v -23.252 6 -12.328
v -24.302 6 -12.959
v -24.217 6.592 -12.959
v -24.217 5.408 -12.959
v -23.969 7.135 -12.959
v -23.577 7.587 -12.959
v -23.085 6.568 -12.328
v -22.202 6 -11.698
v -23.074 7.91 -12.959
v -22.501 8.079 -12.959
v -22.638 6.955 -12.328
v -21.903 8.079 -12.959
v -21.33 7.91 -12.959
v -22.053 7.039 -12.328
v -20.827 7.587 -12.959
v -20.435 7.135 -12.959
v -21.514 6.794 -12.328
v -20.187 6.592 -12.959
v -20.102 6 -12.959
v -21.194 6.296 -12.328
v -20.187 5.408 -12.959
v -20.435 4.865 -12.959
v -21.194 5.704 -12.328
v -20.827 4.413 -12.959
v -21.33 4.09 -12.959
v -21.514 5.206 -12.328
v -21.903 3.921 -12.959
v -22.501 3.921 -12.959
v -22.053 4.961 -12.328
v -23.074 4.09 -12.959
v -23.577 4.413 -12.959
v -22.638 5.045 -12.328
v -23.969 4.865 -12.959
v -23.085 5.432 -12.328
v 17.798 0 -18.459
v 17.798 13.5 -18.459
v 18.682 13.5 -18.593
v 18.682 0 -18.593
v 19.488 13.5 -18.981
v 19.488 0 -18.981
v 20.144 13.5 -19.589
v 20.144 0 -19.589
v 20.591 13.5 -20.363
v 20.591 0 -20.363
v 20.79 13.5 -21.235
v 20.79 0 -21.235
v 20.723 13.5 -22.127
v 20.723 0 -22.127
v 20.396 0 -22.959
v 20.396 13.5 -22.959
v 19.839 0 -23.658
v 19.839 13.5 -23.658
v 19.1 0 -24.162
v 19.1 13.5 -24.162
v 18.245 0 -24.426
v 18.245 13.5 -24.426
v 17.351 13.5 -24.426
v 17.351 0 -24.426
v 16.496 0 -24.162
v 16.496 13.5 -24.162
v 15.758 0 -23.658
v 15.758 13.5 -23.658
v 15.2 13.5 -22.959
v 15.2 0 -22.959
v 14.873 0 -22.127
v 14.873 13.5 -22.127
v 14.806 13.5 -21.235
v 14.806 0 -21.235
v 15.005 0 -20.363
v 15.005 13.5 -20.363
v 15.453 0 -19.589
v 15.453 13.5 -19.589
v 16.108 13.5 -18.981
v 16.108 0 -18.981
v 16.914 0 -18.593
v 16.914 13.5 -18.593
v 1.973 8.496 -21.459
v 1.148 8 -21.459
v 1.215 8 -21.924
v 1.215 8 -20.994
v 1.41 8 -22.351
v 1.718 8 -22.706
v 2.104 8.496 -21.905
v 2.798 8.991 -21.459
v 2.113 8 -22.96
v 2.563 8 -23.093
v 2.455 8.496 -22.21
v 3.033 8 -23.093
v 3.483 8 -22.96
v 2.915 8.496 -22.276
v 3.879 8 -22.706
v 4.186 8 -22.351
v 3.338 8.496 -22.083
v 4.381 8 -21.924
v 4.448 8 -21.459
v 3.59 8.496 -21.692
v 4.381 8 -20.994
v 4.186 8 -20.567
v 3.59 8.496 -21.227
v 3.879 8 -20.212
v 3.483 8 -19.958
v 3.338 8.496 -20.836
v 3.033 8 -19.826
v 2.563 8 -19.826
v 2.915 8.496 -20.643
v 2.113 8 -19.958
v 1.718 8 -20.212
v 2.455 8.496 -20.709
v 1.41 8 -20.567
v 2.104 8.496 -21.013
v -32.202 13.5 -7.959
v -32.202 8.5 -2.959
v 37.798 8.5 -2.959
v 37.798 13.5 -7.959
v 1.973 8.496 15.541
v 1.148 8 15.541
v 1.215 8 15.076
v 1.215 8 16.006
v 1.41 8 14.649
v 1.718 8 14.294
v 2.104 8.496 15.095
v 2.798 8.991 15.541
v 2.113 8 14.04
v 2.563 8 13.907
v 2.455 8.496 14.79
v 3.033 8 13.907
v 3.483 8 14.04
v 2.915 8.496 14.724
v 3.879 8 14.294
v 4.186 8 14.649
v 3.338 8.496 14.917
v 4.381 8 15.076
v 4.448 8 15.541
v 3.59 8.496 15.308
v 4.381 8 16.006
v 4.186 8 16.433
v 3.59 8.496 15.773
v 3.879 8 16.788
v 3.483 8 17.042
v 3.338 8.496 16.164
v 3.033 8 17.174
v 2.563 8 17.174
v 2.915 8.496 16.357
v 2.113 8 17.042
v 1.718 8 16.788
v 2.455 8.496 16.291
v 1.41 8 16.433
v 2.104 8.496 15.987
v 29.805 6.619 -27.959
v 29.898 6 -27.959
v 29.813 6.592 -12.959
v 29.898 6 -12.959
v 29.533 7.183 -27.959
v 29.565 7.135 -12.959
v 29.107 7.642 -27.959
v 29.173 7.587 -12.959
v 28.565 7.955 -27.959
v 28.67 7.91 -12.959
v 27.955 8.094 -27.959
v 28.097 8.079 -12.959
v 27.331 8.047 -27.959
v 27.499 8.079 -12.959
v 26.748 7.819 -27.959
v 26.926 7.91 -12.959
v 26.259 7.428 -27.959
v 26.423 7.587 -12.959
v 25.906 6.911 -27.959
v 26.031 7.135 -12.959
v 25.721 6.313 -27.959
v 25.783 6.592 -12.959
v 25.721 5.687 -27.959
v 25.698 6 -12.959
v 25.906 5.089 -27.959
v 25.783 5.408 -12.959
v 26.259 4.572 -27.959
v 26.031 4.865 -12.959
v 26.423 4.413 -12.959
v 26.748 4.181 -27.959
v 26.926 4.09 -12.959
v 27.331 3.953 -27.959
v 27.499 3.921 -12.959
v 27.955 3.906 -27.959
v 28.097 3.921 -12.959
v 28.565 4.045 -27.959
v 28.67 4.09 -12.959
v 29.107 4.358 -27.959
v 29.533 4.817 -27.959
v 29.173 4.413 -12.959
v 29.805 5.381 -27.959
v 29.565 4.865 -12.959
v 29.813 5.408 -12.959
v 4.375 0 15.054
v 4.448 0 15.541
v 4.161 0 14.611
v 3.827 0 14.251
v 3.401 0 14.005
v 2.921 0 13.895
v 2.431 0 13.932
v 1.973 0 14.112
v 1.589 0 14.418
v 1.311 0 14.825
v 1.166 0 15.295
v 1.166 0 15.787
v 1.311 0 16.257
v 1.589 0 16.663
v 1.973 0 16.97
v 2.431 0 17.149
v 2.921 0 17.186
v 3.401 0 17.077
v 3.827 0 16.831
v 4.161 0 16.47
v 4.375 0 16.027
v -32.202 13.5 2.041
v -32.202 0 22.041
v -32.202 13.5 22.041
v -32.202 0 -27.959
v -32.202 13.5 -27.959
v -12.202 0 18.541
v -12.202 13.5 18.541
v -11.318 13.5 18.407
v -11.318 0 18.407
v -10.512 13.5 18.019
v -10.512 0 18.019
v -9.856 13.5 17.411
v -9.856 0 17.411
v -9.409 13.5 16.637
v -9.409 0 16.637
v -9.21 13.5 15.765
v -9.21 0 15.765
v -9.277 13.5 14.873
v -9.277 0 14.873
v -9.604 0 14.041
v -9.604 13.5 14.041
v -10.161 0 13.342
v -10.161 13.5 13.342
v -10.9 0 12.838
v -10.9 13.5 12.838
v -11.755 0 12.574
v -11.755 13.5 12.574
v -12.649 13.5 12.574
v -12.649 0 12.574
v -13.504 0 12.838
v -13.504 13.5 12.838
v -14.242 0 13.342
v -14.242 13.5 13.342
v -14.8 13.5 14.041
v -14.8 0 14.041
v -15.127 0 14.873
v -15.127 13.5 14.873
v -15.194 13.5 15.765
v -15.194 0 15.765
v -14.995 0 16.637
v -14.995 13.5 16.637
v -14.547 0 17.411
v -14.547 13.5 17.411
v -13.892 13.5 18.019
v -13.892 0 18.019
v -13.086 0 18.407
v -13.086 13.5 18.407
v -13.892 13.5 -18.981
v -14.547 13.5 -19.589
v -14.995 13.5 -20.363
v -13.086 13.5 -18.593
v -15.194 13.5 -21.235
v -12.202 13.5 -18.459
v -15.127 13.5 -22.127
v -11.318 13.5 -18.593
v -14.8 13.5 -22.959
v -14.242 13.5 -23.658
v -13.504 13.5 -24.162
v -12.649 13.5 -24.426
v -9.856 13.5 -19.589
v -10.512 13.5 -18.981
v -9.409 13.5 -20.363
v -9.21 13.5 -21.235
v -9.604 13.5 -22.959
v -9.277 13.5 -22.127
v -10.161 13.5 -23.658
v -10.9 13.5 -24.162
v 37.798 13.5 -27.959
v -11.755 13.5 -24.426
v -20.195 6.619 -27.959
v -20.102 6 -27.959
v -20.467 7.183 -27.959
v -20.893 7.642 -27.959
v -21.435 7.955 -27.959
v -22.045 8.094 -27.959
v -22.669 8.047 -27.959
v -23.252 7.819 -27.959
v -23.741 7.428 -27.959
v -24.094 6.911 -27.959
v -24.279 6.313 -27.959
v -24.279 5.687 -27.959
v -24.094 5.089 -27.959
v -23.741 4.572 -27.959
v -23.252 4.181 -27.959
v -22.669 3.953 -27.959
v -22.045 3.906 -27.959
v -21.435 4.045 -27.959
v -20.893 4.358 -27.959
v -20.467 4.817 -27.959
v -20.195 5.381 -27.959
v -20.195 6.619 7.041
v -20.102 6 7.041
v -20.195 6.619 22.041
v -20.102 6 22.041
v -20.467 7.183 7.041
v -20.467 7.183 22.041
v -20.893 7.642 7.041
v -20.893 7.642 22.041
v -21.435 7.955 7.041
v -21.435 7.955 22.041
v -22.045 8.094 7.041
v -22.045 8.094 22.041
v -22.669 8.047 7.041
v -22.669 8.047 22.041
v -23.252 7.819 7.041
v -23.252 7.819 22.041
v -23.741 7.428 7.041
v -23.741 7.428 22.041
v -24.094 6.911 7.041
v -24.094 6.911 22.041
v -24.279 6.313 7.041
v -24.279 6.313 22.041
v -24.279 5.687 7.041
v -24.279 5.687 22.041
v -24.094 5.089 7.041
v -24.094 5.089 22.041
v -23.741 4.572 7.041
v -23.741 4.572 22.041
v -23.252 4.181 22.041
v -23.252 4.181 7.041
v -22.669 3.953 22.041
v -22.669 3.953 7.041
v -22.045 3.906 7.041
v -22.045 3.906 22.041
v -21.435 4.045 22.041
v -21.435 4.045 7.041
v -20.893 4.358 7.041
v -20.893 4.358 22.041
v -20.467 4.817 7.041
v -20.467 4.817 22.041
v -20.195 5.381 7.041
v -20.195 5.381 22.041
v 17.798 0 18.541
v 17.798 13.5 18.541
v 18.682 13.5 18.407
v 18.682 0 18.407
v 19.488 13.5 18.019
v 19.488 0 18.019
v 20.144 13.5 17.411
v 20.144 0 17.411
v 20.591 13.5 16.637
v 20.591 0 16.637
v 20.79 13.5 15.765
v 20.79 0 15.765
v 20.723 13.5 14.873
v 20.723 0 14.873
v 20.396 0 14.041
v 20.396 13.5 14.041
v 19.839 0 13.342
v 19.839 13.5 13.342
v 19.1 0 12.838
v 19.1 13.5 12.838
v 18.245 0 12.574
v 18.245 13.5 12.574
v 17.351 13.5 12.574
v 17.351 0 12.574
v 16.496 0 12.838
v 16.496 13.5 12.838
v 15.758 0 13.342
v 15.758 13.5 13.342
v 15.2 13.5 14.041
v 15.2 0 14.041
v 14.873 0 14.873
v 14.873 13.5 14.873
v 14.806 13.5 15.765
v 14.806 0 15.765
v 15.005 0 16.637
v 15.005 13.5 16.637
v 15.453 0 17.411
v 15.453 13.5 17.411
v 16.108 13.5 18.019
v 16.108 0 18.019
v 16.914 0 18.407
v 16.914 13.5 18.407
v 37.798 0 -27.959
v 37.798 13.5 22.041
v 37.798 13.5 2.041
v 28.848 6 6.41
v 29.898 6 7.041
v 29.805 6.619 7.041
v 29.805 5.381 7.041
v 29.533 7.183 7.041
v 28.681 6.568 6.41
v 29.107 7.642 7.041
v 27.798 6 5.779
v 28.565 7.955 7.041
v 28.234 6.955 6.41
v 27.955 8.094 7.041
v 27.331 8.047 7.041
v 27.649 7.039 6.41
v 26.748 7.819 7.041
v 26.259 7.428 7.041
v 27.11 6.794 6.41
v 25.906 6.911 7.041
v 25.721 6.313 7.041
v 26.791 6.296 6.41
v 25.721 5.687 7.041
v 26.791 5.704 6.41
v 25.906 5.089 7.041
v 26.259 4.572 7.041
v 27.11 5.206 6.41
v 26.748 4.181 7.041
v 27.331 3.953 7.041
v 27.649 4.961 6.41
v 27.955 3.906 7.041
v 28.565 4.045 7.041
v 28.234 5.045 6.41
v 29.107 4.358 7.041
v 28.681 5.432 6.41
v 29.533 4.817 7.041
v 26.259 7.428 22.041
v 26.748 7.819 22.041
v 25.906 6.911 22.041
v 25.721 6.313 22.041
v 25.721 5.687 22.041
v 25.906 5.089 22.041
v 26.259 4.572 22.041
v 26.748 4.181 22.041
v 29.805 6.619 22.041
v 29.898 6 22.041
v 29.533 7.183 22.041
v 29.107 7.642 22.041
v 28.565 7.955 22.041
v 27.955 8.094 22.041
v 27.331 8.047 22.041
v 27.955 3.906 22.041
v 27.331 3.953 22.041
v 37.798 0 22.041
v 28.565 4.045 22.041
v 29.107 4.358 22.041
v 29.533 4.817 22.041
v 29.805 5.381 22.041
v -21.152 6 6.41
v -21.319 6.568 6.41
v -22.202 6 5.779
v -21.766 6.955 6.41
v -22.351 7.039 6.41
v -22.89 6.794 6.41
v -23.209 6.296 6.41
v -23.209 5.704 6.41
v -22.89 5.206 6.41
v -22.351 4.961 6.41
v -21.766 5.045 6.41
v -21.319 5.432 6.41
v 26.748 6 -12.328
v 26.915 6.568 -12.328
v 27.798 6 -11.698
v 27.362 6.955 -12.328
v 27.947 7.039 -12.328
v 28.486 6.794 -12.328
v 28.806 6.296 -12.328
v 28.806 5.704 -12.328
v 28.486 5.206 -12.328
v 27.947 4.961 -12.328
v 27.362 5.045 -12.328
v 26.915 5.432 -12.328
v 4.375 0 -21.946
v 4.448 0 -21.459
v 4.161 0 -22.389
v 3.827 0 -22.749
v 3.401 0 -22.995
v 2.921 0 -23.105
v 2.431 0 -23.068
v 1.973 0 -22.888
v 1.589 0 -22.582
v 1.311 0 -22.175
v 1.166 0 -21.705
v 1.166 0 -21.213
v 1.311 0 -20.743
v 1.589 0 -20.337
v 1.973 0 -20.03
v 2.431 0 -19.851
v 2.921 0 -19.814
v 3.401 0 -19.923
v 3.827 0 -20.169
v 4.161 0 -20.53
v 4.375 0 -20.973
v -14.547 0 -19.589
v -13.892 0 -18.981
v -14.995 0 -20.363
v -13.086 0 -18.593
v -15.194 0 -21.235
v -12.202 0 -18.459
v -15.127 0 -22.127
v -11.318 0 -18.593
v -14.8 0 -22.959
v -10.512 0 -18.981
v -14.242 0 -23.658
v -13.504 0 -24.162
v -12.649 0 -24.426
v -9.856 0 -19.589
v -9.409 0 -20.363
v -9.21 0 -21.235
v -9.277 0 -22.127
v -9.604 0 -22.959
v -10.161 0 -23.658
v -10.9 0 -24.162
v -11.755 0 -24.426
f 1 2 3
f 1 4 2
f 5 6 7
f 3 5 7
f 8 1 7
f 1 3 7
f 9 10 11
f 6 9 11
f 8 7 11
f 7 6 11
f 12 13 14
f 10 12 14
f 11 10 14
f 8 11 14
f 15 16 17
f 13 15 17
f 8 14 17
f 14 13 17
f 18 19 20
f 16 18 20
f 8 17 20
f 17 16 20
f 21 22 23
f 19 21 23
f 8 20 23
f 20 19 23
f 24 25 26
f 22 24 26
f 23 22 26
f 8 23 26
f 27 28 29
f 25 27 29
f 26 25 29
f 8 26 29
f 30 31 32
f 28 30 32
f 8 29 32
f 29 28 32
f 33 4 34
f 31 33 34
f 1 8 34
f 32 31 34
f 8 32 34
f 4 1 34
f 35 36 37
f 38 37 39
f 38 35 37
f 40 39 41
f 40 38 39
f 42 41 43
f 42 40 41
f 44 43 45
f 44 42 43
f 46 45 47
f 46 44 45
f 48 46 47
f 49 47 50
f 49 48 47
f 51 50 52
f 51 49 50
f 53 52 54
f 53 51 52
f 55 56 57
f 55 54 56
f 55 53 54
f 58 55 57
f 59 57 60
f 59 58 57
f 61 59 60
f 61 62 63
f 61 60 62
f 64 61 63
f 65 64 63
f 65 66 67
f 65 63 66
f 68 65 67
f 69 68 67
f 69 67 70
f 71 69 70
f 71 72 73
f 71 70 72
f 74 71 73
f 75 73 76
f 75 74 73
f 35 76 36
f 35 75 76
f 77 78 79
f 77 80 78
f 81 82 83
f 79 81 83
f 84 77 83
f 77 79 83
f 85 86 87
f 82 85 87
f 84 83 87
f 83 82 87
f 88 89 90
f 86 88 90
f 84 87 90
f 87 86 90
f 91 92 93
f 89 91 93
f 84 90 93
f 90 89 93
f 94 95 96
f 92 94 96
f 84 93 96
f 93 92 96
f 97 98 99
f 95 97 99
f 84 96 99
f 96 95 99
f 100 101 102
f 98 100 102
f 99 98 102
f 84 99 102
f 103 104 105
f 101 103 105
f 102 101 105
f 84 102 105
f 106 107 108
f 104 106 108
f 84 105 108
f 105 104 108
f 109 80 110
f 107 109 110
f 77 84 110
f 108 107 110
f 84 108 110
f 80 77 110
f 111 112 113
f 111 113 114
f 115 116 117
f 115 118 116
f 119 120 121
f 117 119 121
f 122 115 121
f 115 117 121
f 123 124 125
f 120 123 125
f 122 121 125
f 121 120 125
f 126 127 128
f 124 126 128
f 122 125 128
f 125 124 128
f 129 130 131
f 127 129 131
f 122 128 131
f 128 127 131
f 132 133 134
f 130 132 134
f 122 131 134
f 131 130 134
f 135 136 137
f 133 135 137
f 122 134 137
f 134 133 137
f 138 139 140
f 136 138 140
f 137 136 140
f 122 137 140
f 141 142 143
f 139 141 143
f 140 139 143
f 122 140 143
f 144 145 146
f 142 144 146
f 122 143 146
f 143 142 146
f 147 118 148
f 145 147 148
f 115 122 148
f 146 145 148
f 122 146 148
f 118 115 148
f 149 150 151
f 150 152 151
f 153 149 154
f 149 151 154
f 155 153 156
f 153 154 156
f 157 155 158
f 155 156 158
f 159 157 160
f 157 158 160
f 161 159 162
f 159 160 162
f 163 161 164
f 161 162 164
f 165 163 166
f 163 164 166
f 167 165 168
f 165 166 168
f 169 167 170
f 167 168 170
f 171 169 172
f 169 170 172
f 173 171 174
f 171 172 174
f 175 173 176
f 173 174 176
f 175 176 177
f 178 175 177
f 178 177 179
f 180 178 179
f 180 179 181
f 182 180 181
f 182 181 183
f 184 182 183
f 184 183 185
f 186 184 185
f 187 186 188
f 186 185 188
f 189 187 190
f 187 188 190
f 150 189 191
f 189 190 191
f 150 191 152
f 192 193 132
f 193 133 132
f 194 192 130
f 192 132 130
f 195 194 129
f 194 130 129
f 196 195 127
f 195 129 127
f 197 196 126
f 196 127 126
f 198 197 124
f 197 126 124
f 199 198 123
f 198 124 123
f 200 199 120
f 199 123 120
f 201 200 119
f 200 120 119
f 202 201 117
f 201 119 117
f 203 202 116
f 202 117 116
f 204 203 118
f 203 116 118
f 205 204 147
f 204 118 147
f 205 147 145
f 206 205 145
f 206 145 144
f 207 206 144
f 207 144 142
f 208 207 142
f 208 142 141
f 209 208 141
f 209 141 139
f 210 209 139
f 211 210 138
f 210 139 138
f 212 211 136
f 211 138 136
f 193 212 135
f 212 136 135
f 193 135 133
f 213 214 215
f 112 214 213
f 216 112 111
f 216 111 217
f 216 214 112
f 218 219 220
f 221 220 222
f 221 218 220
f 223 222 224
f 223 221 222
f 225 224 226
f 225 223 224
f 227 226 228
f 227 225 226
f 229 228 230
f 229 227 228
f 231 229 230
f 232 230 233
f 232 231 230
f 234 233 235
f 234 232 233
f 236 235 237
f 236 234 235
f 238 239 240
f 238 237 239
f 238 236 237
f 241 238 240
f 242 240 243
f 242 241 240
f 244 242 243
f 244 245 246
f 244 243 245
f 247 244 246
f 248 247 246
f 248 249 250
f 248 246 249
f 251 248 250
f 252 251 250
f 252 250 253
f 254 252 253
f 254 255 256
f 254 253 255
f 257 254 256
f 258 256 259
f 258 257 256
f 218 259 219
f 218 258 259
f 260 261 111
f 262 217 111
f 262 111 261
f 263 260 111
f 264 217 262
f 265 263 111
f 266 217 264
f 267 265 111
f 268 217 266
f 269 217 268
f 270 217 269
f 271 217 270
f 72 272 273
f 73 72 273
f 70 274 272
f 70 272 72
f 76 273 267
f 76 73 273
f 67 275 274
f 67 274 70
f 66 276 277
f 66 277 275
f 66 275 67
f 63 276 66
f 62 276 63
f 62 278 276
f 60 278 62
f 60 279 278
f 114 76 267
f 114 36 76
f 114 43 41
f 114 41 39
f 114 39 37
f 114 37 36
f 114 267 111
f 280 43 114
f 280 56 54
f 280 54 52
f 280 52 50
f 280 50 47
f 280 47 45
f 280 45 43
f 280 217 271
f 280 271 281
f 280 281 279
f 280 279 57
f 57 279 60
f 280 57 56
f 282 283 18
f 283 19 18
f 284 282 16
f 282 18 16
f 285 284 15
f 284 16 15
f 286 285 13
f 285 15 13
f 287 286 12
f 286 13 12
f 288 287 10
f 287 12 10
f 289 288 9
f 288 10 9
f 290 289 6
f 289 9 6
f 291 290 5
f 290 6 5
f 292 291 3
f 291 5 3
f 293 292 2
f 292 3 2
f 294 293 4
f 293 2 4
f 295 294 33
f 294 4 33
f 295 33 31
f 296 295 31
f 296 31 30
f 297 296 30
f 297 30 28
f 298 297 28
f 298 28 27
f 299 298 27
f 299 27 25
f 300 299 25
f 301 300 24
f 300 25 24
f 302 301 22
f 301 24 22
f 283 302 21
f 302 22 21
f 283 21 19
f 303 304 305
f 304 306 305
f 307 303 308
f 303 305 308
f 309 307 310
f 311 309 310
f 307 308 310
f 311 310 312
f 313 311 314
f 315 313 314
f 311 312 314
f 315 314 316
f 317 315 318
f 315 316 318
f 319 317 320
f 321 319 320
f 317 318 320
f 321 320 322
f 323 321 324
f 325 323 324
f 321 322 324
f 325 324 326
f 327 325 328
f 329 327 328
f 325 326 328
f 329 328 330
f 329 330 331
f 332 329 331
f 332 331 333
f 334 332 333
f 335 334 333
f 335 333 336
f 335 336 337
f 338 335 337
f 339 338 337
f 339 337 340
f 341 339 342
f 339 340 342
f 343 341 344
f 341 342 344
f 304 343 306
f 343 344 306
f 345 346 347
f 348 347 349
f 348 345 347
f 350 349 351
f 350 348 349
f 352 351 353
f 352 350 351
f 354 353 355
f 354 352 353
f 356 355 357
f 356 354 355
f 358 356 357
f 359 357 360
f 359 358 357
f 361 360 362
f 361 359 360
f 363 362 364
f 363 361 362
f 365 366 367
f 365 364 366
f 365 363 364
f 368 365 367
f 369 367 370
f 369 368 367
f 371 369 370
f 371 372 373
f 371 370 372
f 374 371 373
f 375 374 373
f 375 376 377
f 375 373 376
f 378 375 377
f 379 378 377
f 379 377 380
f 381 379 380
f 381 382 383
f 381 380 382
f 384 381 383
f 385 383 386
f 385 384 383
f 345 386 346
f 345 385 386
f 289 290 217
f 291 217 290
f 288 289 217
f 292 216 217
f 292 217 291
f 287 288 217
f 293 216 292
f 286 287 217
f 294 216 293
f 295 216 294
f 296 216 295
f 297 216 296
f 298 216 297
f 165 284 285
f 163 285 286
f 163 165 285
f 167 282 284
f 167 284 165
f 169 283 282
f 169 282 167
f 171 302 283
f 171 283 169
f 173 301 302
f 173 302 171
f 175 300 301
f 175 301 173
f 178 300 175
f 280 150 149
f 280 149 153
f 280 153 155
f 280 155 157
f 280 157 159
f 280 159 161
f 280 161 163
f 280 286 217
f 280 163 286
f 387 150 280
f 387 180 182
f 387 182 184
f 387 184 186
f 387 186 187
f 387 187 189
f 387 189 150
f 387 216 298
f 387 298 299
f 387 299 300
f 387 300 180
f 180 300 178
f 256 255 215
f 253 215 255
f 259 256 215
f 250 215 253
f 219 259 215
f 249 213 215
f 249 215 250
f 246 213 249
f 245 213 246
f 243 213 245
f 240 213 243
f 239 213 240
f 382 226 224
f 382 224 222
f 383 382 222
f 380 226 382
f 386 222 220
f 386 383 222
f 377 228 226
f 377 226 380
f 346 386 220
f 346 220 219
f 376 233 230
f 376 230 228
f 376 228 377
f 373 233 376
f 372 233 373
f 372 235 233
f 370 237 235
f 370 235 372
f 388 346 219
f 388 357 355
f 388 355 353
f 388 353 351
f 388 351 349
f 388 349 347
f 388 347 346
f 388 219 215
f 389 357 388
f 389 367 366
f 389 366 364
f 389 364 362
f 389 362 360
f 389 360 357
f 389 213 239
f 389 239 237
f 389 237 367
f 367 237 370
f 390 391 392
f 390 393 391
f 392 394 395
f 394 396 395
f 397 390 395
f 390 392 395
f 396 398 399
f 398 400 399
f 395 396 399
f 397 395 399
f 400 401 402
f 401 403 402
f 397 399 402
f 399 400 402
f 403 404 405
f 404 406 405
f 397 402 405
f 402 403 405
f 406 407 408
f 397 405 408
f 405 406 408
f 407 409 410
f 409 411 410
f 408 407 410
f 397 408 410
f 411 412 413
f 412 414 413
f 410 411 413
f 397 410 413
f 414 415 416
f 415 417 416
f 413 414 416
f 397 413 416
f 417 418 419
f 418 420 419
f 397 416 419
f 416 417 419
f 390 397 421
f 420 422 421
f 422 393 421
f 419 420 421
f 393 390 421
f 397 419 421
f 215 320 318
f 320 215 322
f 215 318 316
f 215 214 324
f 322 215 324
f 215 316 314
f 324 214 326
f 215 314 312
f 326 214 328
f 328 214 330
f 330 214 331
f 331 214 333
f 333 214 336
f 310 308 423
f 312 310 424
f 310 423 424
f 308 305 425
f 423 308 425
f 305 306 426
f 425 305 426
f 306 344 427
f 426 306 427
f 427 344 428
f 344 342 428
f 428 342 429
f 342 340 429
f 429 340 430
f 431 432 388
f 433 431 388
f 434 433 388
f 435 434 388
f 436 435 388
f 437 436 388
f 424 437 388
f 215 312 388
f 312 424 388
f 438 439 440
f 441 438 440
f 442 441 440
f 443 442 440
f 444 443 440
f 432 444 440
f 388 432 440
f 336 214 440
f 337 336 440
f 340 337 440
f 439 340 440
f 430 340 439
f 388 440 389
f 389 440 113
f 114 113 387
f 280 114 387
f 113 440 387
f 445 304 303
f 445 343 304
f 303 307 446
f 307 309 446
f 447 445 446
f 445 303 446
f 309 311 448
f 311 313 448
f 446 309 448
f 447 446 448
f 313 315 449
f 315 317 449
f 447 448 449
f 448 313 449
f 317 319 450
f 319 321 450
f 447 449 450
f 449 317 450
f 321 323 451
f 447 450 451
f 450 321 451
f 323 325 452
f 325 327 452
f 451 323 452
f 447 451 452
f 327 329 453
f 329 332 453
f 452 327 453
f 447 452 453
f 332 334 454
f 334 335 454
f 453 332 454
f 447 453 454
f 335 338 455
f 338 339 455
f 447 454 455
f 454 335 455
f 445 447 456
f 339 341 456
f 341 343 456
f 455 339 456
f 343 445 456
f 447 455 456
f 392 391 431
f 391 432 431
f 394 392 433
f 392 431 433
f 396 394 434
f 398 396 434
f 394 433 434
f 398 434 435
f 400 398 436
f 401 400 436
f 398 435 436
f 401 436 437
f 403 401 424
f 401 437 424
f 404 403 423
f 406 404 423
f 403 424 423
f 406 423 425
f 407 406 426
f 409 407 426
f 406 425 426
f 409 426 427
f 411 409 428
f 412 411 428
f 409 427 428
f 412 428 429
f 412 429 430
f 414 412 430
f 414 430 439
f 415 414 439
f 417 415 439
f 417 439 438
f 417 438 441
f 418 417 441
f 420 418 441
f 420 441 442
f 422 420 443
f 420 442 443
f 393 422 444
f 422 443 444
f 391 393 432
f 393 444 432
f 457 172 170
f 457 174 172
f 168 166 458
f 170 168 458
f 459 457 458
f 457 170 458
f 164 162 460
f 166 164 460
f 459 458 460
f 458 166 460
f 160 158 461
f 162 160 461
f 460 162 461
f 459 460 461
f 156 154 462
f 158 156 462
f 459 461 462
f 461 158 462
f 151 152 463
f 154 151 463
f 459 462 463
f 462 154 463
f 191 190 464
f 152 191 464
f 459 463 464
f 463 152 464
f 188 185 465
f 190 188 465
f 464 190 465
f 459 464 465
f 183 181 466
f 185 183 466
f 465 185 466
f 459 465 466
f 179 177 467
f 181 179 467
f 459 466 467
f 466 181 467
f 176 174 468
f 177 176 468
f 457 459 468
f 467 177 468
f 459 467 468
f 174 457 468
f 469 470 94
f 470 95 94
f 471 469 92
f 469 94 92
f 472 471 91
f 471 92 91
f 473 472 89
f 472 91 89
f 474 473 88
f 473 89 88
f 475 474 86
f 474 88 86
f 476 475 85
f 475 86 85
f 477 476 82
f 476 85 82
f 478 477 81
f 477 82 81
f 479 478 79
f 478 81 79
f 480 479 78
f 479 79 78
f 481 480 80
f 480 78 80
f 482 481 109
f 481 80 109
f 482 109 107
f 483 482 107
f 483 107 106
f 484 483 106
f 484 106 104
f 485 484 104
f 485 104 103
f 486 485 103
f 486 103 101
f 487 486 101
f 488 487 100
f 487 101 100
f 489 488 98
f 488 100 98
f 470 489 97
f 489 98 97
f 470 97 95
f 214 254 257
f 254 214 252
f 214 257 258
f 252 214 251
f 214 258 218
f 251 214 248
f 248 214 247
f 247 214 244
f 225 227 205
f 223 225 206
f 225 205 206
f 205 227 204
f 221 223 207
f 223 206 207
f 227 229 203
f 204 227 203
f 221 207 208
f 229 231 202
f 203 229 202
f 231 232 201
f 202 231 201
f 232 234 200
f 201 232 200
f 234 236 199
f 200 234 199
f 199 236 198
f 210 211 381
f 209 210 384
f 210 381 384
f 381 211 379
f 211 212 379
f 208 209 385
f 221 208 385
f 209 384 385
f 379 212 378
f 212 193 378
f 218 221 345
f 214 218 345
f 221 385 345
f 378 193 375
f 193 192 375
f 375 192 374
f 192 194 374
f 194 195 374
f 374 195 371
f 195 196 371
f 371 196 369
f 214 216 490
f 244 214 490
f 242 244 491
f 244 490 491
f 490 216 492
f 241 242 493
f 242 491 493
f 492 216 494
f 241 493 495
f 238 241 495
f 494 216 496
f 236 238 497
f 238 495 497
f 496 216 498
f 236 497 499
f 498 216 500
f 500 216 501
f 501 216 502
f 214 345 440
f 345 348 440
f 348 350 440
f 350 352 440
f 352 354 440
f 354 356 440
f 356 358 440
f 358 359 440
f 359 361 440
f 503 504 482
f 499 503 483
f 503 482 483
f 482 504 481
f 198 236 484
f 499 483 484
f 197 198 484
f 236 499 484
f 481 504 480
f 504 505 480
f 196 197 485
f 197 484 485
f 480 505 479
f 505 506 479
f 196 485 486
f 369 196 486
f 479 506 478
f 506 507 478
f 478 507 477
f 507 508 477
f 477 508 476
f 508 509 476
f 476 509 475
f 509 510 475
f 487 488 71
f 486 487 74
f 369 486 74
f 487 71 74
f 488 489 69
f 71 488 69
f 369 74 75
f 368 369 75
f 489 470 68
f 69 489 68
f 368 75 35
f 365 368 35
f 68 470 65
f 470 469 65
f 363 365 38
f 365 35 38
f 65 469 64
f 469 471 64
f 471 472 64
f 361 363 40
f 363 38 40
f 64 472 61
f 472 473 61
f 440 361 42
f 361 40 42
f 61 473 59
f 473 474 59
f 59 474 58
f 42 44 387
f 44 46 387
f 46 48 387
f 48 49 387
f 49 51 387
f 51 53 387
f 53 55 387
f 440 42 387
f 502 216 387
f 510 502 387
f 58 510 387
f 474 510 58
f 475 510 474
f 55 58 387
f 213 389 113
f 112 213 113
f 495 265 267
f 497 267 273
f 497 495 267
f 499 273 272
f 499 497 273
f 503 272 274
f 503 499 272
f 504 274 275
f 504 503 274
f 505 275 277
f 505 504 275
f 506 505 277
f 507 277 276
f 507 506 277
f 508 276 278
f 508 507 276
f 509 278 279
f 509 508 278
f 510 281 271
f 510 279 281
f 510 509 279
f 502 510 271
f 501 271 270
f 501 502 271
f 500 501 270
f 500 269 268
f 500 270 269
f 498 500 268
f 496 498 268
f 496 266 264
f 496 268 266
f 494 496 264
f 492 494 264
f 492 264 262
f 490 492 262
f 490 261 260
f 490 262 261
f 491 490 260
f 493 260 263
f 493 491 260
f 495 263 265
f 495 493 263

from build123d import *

# Parameters (mm, degrees)
SKETCH1_W             = 70
SKETCH1_H             = 50
BOSS_EXTRUDE1_DEPTH   = 13.5
CUT_EXTRUDE1_DEPTH    = 78.5
SKETCH6_R             = 3
CUT_EXTRUDE2_DEPTH    = 200
M4_TAPPED_HOLE1_D     = 3.3
M4_TAPPED_HOLE1_DEPTH = 8
M4_TAPPED_HOLE1_TIP   = 0.991420021
M5_TAPPED_HOLE1_D     = 4.2
M5_TAPPED_HOLE1_DEPTH = 15
M5_TAPPED_HOLE1_TIP   = 1.2618073


# Read off the part's stored shape, not the designer's step: M5 Tapped Hole2
with BuildPart() as part:
    # Sketch1 → Boss-Extrude1 (new body)
    with BuildSketch(Plane(origin=(0, 0, 0), x_dir=(1, 0, 0), z_dir=(0, 1, 0))):
        with Locations((2.798036466, 2.959326788)):
            Rectangle(SKETCH1_W, SKETCH1_H)
    extrude(amount=BOSS_EXTRUDE1_DEPTH)

    # Sketch3 → Cut-Extrude1 (cut)
    with BuildSketch(Plane.ZY.offset(32.201963534)):
        Polygon((-2.959326788, 8.5), (-7.959326788, 13.5), (2.040673212, 13.5), align=None)
    extrude(amount=-CUT_EXTRUDE1_DEPTH, mode=Mode.SUBTRACT)

    # Sketch6 → Cut-Extrude2 (cut)
    with BuildSketch(Plane(origin=(0, 0, 0), x_dir=(1, 0, 0), z_dir=(0, 1, 0))):
        with Locations(Location((-12.201963534, -15.540673212, 0), (0, 0, 270))):
            Circle(SKETCH6_R)
        with Locations(Location((17.798036466, -15.540673212, 0), (0, 0, 270))):
            Circle(SKETCH6_R)
        with Locations(Location((-12.201963534, 21.459326788, 0), (0, 0, 270))):
            Circle(SKETCH6_R)
        with Locations(Location((17.798036466, 21.459326788, 0), (0, 0, 270))):
            Circle(SKETCH6_R)
    extrude(amount=CUT_EXTRUDE2_DEPTH, mode=Mode.SUBTRACT)

    # M4 Tapped Hole1
    with Locations(Plane(origin=(0, 0, 0), x_dir=(-1, 0, 0), z_dir=(0, -1, 0))):
        with Locations((-2.798036466, -15.540673212), (-2.798036466, 21.459326788)):
            Hole(M4_TAPPED_HOLE1_D / 2, depth=M4_TAPPED_HOLE1_DEPTH)
            with Locations((0, 0, -(M4_TAPPED_HOLE1_DEPTH + M4_TAPPED_HOLE1_TIP / 2))):  # 118° drill point
                Cone(0, M4_TAPPED_HOLE1_D / 2, M4_TAPPED_HOLE1_TIP, mode=Mode.SUBTRACT)

    # M5 Tapped Hole1
    with Locations(Plane(origin=(0, 0, -27.959326788), x_dir=(-1, 0, 0), z_dir=(0, 0, -1))):
        with Locations((-27.798036466, 6), (22.201963534, 6)):
            Hole(M5_TAPPED_HOLE1_D / 2, depth=M5_TAPPED_HOLE1_DEPTH)
            with Locations((0, 0, -(M5_TAPPED_HOLE1_DEPTH + M5_TAPPED_HOLE1_TIP / 2))):  # 118° drill point
                Cone(0, M5_TAPPED_HOLE1_D / 2, M5_TAPPED_HOLE1_TIP, mode=Mode.SUBTRACT)

    # M5 Tapped Hole2 outline → M5 Tapped Hole2 (revolve, cut)
    with BuildSketch(Plane(origin=(-22.201963534, 6, 0), x_dir=(1, 0, 0), z_dir=(0, -1, 0))):
        Polygon((0, 5.778865912), (2.1, 7.040673212), (2.1, 22.040673212), (0, 22.040673212), align=None)
    revolve(axis=Axis((-22.201963534, 6, 0), (0, 0, 1)), mode=Mode.SUBTRACT)

    # M5 Tapped Hole2 2 outline → M5 Tapped Hole2 2 (revolve, cut)
    with BuildSketch(Plane(origin=(27.798036466, 6, 0), x_dir=(1, 0, 0), z_dir=(0, -1, 0))):
        Polygon((0, 5.778865912), (2.1, 7.040673212), (2.1, 22.040673212), (0, 22.040673212), align=None)
    revolve(axis=Axis((27.798036466, 6, 0), (0, 0, 1)), mode=Mode.SUBTRACT)


solid = part.part
